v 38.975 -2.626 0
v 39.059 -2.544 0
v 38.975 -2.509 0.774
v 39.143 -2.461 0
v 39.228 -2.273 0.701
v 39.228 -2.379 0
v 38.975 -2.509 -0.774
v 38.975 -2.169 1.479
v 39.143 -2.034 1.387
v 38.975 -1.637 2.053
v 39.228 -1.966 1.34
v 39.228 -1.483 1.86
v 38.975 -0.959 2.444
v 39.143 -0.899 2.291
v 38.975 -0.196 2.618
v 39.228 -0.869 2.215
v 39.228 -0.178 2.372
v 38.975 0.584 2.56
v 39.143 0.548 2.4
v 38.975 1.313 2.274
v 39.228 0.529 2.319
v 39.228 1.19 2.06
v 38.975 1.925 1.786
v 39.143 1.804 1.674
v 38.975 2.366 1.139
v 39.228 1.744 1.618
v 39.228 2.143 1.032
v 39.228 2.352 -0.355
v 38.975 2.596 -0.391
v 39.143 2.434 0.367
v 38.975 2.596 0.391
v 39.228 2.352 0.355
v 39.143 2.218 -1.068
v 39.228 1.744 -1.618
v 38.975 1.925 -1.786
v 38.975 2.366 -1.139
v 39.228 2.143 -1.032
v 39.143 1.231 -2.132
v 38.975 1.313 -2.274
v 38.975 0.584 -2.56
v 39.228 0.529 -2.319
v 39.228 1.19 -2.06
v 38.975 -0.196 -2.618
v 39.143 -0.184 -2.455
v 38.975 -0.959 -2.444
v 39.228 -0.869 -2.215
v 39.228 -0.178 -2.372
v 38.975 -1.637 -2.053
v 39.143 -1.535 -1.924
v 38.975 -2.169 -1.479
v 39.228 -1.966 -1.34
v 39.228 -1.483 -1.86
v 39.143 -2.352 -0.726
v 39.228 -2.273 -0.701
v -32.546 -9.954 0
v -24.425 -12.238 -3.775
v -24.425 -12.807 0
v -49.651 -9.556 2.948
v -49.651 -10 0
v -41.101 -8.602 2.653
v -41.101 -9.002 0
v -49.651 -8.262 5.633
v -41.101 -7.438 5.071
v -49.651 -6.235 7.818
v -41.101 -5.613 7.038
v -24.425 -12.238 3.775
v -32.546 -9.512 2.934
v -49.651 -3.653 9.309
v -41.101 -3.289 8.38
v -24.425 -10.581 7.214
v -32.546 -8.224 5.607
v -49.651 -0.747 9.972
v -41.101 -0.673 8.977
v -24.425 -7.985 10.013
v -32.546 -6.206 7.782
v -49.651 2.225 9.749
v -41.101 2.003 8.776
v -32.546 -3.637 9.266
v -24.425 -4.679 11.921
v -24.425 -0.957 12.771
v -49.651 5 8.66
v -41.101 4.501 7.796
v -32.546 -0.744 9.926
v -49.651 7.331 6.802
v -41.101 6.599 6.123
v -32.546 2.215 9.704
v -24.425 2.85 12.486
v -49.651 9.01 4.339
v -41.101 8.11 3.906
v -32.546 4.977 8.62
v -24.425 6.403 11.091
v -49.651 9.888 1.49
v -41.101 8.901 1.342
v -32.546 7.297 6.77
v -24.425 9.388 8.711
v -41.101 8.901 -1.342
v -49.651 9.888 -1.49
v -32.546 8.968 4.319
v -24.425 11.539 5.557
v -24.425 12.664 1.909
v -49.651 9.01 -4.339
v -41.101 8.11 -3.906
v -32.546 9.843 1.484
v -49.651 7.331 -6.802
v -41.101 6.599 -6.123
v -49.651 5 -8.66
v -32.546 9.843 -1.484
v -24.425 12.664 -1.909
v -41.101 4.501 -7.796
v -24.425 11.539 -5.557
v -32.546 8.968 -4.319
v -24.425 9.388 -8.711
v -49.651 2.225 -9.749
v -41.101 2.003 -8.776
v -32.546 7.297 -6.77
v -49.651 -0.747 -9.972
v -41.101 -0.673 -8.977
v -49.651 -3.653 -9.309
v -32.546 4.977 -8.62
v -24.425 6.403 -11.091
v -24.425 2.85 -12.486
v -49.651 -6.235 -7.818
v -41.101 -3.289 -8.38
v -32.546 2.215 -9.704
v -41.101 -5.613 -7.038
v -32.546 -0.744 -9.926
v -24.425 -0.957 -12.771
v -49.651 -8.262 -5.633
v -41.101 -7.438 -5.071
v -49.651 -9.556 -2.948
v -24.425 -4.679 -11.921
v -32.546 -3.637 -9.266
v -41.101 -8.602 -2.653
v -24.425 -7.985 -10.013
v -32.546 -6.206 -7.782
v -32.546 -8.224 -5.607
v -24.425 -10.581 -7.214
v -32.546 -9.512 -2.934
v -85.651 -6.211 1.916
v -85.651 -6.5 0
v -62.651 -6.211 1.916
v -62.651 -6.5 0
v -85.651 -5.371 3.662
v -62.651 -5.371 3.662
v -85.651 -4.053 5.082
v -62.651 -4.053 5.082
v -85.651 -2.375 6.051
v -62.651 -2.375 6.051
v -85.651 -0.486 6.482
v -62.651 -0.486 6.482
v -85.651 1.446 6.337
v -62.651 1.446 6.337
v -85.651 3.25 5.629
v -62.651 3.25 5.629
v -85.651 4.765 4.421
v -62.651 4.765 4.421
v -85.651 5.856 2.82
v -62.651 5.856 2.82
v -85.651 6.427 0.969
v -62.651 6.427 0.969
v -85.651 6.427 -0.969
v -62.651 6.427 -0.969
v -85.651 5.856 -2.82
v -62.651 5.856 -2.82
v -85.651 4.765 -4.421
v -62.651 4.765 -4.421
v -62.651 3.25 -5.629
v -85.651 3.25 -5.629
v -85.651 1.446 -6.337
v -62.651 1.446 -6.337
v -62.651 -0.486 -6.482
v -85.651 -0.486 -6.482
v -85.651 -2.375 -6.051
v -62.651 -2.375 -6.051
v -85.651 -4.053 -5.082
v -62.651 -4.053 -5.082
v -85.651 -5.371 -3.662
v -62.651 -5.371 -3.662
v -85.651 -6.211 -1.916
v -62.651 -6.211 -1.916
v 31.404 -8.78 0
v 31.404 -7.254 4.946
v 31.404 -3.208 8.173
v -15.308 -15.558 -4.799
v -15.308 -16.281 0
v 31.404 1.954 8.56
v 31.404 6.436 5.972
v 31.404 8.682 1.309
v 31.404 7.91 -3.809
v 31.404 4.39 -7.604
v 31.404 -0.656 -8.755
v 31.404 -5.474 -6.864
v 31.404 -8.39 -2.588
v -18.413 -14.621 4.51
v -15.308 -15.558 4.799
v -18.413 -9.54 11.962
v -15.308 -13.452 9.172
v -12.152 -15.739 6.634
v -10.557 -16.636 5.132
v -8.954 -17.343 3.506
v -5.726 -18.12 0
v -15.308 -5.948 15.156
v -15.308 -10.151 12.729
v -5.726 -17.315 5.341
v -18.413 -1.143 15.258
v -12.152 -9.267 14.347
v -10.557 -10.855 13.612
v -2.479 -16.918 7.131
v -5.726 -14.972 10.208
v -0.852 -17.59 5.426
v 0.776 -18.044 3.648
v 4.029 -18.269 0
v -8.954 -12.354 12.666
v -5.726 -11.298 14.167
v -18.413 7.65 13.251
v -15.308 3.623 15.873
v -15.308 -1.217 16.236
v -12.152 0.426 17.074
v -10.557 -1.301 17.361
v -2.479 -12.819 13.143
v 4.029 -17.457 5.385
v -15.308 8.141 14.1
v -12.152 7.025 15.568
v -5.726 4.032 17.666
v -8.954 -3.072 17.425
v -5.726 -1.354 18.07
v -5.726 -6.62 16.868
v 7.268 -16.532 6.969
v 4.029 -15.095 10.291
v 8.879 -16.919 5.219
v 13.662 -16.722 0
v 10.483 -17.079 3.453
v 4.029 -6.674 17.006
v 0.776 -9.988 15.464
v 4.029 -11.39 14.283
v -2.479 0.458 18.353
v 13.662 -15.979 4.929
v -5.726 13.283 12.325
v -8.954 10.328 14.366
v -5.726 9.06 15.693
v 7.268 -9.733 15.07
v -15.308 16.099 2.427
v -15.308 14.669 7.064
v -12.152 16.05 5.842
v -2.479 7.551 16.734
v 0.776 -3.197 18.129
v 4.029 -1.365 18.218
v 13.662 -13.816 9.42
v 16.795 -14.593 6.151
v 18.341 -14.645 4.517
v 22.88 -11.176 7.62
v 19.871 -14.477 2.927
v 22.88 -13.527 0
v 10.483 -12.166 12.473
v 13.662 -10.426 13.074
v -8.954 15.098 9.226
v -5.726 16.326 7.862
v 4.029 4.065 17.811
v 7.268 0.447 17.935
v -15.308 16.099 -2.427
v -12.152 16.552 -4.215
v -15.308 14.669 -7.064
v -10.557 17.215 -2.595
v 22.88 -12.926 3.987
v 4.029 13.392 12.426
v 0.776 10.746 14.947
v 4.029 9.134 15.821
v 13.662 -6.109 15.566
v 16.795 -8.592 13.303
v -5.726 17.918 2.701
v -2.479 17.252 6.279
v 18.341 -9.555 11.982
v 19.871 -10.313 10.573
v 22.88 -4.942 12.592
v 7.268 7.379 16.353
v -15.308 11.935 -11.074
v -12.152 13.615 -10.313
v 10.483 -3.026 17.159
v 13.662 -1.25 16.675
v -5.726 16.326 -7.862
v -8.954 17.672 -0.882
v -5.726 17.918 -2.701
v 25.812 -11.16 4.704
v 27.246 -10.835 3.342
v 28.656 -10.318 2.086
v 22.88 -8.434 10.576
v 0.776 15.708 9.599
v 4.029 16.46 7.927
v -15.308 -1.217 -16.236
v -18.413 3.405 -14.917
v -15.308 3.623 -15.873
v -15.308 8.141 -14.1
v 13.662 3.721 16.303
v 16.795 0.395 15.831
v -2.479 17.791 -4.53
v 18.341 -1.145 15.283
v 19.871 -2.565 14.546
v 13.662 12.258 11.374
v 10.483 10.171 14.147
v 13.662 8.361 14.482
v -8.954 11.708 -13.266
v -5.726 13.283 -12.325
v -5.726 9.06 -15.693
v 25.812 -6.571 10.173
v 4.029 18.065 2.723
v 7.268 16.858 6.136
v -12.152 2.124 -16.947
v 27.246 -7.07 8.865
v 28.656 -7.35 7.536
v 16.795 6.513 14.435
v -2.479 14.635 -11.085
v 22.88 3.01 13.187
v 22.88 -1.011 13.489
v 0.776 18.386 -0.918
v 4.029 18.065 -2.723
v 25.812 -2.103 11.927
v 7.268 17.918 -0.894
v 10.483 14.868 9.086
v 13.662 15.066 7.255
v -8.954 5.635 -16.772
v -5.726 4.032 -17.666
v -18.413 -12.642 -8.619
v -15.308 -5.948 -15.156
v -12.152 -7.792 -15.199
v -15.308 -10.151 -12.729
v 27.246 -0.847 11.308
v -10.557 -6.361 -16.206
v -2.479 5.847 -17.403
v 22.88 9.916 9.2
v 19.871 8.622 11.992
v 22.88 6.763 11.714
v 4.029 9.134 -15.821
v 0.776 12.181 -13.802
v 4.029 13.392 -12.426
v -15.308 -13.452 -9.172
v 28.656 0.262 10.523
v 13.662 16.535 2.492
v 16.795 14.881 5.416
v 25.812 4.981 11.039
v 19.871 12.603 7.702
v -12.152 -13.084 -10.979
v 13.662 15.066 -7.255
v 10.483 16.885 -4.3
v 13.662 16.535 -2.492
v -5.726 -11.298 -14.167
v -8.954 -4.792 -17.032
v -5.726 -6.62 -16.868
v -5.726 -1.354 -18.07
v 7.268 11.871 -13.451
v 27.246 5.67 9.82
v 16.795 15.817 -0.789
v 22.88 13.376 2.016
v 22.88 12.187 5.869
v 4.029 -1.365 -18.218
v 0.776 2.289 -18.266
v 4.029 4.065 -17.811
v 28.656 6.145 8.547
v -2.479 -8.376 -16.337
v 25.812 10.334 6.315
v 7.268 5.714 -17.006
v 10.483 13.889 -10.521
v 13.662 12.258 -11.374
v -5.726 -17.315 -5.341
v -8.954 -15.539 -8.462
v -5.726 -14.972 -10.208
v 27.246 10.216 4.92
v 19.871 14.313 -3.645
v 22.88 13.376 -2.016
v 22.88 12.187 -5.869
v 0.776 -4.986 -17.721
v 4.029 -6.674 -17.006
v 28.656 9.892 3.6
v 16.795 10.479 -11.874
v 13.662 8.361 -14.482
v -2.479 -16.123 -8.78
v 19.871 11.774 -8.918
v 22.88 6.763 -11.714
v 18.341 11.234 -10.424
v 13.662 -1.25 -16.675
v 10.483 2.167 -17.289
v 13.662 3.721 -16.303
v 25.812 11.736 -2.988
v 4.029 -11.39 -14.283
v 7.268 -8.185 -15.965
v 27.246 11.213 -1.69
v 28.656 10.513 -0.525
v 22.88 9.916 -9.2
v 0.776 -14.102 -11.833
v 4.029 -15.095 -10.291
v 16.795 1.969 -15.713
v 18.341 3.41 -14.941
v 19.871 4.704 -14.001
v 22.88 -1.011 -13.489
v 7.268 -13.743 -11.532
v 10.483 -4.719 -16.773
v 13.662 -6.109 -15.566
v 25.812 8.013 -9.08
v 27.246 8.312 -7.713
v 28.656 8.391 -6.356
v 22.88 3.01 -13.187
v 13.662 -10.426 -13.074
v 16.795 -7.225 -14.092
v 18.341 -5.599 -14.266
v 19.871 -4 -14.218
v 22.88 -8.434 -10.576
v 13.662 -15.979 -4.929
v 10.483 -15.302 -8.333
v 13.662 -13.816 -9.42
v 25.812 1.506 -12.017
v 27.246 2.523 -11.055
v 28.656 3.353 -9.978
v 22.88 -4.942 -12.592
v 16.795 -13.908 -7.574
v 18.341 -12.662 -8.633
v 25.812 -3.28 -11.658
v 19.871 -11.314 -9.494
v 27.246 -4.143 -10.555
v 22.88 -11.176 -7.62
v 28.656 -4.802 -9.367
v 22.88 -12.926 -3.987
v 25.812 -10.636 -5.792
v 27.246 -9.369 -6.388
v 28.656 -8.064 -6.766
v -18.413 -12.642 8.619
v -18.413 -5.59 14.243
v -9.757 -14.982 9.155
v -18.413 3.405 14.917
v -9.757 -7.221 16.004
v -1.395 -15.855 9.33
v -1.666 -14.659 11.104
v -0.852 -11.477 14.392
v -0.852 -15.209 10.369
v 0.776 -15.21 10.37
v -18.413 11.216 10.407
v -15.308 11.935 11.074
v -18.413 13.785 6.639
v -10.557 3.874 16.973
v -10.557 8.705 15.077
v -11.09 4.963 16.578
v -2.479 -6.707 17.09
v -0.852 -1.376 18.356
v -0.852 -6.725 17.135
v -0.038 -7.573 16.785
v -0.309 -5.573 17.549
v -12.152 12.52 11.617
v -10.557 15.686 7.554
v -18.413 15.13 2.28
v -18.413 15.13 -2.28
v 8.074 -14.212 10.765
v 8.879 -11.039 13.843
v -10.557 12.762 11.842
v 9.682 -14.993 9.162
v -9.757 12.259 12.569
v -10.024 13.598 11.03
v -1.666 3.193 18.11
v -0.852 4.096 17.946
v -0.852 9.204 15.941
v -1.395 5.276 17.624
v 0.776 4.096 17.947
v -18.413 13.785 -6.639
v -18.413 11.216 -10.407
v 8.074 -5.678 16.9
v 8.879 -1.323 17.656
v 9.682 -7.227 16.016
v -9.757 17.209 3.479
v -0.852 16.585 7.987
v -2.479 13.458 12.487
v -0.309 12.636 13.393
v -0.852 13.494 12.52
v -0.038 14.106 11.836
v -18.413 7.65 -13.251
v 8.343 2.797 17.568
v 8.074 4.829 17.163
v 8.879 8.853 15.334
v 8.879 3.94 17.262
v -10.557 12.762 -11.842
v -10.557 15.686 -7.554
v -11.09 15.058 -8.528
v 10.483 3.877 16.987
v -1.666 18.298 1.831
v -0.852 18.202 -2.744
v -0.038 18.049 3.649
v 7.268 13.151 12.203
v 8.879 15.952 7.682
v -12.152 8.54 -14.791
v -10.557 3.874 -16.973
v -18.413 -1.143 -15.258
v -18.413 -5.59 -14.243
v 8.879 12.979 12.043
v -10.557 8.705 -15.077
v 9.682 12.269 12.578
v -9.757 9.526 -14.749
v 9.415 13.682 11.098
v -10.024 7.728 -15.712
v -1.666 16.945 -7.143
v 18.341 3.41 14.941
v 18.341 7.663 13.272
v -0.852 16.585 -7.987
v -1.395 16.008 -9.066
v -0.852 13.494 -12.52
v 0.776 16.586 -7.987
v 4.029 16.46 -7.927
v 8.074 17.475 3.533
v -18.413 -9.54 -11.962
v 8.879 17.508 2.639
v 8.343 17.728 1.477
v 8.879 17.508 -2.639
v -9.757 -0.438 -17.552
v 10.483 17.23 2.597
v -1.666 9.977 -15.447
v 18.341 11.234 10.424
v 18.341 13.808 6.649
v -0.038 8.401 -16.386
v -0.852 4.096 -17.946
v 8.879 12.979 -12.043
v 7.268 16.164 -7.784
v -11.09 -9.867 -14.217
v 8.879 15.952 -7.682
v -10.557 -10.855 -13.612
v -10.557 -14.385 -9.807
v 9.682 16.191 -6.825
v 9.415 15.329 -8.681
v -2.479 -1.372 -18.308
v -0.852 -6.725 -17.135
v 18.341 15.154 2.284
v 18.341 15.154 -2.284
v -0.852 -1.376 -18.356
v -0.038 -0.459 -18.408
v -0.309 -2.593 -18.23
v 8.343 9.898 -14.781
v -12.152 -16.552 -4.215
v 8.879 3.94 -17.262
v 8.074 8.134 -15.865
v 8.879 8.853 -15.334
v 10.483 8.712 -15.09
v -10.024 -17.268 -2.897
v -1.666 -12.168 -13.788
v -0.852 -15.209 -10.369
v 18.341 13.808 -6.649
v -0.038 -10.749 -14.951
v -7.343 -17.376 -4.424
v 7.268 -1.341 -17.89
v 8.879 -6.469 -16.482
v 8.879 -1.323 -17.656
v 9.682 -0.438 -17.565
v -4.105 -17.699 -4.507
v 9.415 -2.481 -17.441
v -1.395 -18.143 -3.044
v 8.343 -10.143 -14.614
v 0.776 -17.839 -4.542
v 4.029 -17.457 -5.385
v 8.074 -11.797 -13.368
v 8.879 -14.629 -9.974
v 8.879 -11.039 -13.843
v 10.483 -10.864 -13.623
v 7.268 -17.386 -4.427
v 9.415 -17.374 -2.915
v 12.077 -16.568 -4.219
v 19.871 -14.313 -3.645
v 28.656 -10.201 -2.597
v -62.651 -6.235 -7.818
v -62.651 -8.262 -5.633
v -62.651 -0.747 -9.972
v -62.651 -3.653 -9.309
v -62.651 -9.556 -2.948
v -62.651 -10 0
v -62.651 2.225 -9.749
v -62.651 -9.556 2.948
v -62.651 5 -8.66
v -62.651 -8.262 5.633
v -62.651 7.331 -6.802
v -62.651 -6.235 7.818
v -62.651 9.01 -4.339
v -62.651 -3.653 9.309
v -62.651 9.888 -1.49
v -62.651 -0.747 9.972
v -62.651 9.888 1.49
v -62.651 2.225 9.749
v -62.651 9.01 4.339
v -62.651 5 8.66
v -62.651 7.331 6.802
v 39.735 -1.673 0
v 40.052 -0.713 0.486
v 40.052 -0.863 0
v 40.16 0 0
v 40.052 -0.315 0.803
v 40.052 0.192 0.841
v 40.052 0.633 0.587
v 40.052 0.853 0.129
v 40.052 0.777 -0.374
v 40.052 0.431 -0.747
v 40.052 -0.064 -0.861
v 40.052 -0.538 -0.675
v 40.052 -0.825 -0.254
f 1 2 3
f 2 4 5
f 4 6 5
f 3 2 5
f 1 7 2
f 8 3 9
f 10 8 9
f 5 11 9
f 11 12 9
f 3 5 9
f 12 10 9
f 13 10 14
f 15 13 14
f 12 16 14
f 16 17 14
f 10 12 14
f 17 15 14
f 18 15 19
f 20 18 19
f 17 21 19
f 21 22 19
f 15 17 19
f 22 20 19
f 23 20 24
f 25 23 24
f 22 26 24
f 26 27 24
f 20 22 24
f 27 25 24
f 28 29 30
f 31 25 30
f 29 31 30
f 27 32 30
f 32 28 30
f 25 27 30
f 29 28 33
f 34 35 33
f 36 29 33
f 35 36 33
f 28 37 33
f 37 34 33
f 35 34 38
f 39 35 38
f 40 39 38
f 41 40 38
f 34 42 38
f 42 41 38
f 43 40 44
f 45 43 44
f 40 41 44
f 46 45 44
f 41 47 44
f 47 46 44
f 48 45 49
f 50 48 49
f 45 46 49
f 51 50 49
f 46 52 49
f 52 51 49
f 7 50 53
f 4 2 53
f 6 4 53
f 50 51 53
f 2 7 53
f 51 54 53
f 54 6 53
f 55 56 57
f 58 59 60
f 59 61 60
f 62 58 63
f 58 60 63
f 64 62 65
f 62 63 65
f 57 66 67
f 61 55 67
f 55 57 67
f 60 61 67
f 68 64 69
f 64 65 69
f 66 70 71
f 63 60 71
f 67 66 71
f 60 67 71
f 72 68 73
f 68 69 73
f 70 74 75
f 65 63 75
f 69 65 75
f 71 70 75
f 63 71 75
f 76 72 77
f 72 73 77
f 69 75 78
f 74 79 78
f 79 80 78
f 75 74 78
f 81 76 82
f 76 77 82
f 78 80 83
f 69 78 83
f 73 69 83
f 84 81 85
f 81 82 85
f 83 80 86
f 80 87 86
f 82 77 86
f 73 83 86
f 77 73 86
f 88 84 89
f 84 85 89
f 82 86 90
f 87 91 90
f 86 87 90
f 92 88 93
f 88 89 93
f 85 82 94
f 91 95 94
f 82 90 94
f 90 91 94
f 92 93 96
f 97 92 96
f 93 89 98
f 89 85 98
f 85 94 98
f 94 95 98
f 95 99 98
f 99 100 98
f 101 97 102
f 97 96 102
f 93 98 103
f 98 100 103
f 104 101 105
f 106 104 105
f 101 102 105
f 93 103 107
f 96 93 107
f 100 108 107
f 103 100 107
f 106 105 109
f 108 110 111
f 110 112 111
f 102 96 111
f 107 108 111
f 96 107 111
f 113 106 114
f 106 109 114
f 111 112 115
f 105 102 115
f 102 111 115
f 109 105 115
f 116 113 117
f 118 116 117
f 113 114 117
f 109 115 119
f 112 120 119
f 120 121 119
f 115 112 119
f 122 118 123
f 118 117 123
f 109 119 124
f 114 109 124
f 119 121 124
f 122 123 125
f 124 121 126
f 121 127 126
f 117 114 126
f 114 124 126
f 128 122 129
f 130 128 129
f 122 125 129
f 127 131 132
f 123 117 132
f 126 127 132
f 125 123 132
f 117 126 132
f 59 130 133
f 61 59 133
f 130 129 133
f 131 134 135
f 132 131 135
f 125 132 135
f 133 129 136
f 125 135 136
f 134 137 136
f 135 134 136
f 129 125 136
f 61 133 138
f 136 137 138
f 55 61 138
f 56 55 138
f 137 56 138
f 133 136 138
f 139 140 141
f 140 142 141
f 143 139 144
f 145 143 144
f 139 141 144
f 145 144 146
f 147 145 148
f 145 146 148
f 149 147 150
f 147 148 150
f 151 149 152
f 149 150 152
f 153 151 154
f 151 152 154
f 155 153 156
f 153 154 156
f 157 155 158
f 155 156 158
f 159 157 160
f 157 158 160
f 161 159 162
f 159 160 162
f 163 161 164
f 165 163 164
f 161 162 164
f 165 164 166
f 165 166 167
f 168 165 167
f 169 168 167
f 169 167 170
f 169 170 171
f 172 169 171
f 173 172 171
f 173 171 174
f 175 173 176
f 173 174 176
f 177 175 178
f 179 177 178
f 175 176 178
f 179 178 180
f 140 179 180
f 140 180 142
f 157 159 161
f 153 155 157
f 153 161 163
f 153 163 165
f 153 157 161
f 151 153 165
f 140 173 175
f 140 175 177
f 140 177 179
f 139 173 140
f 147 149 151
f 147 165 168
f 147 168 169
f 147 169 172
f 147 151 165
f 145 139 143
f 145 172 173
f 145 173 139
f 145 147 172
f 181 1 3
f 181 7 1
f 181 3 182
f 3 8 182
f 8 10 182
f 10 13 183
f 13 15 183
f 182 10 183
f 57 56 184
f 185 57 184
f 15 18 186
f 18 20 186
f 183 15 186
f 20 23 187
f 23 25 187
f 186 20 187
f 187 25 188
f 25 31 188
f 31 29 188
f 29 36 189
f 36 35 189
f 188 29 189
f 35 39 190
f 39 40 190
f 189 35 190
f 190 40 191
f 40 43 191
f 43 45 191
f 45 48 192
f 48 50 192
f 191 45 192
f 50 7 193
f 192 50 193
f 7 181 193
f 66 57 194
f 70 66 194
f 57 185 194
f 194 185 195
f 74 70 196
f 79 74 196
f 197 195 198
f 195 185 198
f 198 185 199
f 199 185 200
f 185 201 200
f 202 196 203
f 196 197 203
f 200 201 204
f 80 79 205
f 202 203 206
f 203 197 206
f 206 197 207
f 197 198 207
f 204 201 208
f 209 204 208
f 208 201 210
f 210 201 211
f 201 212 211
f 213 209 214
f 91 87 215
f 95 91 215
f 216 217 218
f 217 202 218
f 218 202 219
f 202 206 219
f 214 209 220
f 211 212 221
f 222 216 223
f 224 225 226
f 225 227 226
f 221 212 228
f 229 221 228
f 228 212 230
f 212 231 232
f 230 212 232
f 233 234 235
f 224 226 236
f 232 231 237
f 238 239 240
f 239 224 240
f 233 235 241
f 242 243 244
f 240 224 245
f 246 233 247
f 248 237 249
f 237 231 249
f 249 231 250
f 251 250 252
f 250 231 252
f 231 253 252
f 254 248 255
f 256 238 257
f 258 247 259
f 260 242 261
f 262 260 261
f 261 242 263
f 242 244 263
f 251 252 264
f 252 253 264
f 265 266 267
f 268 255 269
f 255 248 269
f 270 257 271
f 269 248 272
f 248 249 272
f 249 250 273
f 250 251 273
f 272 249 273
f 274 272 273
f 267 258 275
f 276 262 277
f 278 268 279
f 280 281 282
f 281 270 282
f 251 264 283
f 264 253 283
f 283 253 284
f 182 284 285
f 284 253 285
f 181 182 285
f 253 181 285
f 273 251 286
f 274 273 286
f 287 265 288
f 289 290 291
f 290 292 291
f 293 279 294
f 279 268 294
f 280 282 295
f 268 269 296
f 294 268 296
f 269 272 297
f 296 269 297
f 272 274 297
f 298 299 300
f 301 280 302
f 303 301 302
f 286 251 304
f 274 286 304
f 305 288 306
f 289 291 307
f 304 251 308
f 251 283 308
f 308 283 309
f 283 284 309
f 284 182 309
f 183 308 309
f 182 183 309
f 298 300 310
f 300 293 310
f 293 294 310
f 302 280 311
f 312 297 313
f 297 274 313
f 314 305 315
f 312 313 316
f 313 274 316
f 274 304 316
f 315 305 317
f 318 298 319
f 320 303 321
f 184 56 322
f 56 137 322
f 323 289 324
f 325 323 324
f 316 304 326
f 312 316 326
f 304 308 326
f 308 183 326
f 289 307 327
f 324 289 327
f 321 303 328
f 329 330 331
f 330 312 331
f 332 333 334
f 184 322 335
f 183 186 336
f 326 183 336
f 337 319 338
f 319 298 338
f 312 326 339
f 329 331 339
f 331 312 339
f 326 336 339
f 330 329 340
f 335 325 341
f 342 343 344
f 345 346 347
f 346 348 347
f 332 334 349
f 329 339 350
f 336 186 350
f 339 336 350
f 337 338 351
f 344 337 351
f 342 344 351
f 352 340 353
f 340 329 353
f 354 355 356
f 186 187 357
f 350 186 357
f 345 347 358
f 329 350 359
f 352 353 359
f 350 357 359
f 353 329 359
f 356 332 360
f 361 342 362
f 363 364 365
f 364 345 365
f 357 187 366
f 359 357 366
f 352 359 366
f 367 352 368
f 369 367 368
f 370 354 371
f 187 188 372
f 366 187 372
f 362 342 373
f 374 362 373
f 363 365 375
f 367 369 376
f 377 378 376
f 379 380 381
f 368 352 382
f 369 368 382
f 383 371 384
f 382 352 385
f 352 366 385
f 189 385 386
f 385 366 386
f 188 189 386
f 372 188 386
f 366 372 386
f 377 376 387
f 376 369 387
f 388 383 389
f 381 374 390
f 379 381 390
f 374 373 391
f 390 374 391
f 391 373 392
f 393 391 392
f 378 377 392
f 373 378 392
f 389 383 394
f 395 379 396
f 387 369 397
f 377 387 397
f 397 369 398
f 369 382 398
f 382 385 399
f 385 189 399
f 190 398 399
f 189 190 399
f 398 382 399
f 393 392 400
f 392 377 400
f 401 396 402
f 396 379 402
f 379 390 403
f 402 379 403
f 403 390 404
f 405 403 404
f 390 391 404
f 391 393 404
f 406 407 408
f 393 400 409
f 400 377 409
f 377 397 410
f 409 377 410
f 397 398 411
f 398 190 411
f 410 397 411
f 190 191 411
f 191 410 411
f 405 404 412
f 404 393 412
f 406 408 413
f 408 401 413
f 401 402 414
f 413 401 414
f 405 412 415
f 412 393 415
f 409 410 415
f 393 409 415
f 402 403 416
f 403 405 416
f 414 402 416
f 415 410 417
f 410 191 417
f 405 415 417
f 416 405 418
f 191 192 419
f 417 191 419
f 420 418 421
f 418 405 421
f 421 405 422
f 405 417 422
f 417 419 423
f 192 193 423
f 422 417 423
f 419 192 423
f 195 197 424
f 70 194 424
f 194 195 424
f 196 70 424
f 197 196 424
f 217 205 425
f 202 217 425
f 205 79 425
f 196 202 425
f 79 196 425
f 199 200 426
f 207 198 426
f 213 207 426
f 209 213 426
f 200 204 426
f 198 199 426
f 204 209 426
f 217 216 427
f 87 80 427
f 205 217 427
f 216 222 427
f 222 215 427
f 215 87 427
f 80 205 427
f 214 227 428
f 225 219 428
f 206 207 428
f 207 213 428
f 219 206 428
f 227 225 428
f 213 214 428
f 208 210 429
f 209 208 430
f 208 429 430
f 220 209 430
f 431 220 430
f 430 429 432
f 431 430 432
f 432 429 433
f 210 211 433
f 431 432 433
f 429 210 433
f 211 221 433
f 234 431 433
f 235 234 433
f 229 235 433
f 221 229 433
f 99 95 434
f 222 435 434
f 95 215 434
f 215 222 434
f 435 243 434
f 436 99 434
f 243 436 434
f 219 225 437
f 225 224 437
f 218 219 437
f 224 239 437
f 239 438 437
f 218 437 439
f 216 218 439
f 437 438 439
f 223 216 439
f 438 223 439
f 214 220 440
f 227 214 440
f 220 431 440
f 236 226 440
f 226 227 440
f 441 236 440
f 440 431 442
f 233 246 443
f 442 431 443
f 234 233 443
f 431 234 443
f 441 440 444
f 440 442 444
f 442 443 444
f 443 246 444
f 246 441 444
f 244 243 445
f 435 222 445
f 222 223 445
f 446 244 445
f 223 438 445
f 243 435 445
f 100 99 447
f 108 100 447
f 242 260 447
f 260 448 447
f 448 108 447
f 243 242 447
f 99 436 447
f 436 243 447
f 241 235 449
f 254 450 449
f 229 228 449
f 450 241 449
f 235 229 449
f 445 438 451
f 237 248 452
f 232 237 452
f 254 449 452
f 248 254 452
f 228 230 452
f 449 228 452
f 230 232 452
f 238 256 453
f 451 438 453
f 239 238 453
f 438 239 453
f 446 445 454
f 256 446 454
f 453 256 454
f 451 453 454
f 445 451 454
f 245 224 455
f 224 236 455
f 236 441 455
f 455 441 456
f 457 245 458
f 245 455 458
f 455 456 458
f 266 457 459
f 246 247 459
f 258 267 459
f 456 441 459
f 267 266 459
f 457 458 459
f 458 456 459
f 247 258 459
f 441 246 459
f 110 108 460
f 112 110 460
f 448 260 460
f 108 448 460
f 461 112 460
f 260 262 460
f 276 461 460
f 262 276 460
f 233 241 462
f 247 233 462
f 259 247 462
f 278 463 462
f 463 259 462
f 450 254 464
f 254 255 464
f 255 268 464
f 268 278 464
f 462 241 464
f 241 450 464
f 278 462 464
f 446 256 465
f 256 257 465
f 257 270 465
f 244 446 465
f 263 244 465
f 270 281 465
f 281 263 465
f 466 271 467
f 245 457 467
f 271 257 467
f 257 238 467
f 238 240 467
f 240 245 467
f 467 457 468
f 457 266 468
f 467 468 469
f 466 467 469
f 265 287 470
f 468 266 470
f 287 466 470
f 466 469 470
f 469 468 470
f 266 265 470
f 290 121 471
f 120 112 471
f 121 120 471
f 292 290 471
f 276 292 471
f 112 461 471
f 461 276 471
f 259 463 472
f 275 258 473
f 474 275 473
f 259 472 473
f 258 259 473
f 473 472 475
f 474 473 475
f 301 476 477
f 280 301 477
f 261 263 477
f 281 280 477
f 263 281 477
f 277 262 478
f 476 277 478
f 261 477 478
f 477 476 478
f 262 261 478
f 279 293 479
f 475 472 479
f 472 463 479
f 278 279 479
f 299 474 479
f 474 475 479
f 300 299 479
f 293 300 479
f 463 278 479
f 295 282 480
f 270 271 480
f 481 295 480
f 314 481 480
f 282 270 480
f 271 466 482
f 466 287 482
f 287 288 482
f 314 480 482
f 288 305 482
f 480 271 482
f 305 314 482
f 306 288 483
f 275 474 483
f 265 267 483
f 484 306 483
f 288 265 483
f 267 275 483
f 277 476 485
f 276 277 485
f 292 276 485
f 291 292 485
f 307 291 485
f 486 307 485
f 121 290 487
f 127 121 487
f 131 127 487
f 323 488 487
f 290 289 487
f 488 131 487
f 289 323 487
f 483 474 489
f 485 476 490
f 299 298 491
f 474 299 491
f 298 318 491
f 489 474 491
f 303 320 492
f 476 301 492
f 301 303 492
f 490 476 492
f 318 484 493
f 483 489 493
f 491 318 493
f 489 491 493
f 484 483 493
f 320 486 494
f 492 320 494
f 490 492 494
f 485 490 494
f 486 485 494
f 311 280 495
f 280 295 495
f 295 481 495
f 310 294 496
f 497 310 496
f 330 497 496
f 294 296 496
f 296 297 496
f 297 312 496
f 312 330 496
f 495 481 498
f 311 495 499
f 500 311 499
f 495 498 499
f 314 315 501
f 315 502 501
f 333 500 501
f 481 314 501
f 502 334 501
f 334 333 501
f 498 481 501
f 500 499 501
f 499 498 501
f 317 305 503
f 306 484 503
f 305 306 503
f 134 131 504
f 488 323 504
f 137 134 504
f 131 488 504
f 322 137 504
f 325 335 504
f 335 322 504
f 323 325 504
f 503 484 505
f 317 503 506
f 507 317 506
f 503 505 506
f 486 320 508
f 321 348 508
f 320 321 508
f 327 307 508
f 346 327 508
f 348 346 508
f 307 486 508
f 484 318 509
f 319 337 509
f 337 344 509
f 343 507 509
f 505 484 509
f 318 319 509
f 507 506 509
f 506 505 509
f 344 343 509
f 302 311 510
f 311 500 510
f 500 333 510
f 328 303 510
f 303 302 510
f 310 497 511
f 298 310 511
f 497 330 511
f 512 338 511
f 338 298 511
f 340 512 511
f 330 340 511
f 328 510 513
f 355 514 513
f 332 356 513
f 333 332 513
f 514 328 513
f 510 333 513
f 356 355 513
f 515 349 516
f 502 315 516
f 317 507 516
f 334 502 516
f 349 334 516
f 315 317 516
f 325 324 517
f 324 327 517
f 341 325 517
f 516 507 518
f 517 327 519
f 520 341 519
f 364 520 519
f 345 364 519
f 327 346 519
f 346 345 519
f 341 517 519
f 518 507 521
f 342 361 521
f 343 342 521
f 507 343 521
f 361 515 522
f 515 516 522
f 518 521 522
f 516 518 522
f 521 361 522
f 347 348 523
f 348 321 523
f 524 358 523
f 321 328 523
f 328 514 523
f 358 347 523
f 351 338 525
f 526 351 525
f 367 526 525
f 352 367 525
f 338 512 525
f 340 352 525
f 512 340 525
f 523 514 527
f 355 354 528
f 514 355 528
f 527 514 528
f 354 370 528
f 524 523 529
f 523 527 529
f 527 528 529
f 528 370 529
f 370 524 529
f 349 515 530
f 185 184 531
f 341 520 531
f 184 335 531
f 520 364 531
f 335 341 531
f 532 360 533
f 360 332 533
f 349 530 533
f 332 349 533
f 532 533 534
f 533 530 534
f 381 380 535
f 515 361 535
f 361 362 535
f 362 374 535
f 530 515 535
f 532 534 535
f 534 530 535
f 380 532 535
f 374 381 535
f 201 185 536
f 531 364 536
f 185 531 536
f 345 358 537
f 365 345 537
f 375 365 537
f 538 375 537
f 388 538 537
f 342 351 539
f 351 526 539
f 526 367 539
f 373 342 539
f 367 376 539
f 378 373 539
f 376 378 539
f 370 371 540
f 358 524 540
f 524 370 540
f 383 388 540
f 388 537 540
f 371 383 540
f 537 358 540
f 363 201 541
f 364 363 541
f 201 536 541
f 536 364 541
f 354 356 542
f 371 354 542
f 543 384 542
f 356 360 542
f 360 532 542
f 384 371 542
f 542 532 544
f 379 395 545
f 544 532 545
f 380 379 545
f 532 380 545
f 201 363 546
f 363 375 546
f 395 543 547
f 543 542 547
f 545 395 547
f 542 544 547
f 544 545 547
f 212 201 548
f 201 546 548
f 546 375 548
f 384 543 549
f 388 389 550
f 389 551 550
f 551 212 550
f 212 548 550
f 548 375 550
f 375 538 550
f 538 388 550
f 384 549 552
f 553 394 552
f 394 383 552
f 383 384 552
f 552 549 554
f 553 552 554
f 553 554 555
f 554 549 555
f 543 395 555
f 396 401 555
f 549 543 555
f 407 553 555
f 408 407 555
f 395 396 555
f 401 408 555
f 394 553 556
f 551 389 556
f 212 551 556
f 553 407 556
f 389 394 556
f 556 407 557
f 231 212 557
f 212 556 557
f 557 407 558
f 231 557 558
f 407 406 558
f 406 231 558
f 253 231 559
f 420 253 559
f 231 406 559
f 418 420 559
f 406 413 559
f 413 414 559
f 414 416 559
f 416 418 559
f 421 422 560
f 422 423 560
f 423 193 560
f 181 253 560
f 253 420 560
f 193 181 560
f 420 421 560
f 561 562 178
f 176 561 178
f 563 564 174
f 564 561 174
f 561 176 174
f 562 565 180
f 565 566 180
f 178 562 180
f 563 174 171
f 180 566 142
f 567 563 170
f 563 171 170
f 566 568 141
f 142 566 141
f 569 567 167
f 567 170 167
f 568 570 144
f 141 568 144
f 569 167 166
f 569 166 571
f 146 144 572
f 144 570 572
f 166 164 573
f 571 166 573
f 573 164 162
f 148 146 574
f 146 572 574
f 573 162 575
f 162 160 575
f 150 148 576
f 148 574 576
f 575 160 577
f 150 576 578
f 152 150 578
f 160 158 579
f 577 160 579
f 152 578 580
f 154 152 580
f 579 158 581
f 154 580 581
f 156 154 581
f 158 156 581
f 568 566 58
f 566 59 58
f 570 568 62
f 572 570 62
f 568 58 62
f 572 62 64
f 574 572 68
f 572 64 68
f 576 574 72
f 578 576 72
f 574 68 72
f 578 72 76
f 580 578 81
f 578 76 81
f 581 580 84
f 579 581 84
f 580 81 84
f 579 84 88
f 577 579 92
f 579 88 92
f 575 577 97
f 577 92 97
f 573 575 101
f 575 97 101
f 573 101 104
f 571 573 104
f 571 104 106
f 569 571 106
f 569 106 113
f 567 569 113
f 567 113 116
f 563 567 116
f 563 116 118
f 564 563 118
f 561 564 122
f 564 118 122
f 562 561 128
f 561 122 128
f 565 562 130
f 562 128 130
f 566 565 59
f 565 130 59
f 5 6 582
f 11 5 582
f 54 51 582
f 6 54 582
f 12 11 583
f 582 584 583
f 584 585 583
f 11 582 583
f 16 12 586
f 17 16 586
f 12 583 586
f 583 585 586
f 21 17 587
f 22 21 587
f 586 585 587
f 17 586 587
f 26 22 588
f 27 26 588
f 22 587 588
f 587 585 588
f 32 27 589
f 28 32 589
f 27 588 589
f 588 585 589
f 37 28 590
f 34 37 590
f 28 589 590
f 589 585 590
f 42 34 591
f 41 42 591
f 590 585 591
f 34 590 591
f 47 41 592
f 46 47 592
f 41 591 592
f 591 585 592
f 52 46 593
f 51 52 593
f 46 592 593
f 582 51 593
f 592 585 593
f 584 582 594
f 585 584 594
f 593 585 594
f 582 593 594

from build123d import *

# Parameters (mm, degrees)
F0_W = 23
F0_H = 6.5


with BuildPart() as f1:
    # F0 (on Top) → F1 (revolve)
    with BuildSketch(Plane.XY):
        with BuildLine():
            ThreePointArc((39.227544, -2.37903), (39.918853, -1.277694), (40.160403, 0))
            Line((40.160403, 0), (-62.651278, 0))
            Line((-62.651278, 0), (-62.651278, -6.5))
            Line((-62.651278, -6.5), (-62.651278, -10))
            Line((-62.651278, -10), (-49.651278, -10))
            ThreePointArc((-49.651278, -10), (-36.796792, -9.234882), (-24.424854, -12.806772))
            ThreePointArc((-24.424854, -12.806772), (8.879095, -17.705654), (38.9747, -2.625648))
            ThreePointArc((38.9747, -2.625648), (39.101317, -2.502538), (39.227544, -2.37903))
        make_face()
        with Locations((-74.151278, -3.25)):
            Rectangle(F0_W, F0_H)
    revolve(axis=Axis((-25.326952, 0, 0), (-1, 0, 0)))


solid = f1.part
